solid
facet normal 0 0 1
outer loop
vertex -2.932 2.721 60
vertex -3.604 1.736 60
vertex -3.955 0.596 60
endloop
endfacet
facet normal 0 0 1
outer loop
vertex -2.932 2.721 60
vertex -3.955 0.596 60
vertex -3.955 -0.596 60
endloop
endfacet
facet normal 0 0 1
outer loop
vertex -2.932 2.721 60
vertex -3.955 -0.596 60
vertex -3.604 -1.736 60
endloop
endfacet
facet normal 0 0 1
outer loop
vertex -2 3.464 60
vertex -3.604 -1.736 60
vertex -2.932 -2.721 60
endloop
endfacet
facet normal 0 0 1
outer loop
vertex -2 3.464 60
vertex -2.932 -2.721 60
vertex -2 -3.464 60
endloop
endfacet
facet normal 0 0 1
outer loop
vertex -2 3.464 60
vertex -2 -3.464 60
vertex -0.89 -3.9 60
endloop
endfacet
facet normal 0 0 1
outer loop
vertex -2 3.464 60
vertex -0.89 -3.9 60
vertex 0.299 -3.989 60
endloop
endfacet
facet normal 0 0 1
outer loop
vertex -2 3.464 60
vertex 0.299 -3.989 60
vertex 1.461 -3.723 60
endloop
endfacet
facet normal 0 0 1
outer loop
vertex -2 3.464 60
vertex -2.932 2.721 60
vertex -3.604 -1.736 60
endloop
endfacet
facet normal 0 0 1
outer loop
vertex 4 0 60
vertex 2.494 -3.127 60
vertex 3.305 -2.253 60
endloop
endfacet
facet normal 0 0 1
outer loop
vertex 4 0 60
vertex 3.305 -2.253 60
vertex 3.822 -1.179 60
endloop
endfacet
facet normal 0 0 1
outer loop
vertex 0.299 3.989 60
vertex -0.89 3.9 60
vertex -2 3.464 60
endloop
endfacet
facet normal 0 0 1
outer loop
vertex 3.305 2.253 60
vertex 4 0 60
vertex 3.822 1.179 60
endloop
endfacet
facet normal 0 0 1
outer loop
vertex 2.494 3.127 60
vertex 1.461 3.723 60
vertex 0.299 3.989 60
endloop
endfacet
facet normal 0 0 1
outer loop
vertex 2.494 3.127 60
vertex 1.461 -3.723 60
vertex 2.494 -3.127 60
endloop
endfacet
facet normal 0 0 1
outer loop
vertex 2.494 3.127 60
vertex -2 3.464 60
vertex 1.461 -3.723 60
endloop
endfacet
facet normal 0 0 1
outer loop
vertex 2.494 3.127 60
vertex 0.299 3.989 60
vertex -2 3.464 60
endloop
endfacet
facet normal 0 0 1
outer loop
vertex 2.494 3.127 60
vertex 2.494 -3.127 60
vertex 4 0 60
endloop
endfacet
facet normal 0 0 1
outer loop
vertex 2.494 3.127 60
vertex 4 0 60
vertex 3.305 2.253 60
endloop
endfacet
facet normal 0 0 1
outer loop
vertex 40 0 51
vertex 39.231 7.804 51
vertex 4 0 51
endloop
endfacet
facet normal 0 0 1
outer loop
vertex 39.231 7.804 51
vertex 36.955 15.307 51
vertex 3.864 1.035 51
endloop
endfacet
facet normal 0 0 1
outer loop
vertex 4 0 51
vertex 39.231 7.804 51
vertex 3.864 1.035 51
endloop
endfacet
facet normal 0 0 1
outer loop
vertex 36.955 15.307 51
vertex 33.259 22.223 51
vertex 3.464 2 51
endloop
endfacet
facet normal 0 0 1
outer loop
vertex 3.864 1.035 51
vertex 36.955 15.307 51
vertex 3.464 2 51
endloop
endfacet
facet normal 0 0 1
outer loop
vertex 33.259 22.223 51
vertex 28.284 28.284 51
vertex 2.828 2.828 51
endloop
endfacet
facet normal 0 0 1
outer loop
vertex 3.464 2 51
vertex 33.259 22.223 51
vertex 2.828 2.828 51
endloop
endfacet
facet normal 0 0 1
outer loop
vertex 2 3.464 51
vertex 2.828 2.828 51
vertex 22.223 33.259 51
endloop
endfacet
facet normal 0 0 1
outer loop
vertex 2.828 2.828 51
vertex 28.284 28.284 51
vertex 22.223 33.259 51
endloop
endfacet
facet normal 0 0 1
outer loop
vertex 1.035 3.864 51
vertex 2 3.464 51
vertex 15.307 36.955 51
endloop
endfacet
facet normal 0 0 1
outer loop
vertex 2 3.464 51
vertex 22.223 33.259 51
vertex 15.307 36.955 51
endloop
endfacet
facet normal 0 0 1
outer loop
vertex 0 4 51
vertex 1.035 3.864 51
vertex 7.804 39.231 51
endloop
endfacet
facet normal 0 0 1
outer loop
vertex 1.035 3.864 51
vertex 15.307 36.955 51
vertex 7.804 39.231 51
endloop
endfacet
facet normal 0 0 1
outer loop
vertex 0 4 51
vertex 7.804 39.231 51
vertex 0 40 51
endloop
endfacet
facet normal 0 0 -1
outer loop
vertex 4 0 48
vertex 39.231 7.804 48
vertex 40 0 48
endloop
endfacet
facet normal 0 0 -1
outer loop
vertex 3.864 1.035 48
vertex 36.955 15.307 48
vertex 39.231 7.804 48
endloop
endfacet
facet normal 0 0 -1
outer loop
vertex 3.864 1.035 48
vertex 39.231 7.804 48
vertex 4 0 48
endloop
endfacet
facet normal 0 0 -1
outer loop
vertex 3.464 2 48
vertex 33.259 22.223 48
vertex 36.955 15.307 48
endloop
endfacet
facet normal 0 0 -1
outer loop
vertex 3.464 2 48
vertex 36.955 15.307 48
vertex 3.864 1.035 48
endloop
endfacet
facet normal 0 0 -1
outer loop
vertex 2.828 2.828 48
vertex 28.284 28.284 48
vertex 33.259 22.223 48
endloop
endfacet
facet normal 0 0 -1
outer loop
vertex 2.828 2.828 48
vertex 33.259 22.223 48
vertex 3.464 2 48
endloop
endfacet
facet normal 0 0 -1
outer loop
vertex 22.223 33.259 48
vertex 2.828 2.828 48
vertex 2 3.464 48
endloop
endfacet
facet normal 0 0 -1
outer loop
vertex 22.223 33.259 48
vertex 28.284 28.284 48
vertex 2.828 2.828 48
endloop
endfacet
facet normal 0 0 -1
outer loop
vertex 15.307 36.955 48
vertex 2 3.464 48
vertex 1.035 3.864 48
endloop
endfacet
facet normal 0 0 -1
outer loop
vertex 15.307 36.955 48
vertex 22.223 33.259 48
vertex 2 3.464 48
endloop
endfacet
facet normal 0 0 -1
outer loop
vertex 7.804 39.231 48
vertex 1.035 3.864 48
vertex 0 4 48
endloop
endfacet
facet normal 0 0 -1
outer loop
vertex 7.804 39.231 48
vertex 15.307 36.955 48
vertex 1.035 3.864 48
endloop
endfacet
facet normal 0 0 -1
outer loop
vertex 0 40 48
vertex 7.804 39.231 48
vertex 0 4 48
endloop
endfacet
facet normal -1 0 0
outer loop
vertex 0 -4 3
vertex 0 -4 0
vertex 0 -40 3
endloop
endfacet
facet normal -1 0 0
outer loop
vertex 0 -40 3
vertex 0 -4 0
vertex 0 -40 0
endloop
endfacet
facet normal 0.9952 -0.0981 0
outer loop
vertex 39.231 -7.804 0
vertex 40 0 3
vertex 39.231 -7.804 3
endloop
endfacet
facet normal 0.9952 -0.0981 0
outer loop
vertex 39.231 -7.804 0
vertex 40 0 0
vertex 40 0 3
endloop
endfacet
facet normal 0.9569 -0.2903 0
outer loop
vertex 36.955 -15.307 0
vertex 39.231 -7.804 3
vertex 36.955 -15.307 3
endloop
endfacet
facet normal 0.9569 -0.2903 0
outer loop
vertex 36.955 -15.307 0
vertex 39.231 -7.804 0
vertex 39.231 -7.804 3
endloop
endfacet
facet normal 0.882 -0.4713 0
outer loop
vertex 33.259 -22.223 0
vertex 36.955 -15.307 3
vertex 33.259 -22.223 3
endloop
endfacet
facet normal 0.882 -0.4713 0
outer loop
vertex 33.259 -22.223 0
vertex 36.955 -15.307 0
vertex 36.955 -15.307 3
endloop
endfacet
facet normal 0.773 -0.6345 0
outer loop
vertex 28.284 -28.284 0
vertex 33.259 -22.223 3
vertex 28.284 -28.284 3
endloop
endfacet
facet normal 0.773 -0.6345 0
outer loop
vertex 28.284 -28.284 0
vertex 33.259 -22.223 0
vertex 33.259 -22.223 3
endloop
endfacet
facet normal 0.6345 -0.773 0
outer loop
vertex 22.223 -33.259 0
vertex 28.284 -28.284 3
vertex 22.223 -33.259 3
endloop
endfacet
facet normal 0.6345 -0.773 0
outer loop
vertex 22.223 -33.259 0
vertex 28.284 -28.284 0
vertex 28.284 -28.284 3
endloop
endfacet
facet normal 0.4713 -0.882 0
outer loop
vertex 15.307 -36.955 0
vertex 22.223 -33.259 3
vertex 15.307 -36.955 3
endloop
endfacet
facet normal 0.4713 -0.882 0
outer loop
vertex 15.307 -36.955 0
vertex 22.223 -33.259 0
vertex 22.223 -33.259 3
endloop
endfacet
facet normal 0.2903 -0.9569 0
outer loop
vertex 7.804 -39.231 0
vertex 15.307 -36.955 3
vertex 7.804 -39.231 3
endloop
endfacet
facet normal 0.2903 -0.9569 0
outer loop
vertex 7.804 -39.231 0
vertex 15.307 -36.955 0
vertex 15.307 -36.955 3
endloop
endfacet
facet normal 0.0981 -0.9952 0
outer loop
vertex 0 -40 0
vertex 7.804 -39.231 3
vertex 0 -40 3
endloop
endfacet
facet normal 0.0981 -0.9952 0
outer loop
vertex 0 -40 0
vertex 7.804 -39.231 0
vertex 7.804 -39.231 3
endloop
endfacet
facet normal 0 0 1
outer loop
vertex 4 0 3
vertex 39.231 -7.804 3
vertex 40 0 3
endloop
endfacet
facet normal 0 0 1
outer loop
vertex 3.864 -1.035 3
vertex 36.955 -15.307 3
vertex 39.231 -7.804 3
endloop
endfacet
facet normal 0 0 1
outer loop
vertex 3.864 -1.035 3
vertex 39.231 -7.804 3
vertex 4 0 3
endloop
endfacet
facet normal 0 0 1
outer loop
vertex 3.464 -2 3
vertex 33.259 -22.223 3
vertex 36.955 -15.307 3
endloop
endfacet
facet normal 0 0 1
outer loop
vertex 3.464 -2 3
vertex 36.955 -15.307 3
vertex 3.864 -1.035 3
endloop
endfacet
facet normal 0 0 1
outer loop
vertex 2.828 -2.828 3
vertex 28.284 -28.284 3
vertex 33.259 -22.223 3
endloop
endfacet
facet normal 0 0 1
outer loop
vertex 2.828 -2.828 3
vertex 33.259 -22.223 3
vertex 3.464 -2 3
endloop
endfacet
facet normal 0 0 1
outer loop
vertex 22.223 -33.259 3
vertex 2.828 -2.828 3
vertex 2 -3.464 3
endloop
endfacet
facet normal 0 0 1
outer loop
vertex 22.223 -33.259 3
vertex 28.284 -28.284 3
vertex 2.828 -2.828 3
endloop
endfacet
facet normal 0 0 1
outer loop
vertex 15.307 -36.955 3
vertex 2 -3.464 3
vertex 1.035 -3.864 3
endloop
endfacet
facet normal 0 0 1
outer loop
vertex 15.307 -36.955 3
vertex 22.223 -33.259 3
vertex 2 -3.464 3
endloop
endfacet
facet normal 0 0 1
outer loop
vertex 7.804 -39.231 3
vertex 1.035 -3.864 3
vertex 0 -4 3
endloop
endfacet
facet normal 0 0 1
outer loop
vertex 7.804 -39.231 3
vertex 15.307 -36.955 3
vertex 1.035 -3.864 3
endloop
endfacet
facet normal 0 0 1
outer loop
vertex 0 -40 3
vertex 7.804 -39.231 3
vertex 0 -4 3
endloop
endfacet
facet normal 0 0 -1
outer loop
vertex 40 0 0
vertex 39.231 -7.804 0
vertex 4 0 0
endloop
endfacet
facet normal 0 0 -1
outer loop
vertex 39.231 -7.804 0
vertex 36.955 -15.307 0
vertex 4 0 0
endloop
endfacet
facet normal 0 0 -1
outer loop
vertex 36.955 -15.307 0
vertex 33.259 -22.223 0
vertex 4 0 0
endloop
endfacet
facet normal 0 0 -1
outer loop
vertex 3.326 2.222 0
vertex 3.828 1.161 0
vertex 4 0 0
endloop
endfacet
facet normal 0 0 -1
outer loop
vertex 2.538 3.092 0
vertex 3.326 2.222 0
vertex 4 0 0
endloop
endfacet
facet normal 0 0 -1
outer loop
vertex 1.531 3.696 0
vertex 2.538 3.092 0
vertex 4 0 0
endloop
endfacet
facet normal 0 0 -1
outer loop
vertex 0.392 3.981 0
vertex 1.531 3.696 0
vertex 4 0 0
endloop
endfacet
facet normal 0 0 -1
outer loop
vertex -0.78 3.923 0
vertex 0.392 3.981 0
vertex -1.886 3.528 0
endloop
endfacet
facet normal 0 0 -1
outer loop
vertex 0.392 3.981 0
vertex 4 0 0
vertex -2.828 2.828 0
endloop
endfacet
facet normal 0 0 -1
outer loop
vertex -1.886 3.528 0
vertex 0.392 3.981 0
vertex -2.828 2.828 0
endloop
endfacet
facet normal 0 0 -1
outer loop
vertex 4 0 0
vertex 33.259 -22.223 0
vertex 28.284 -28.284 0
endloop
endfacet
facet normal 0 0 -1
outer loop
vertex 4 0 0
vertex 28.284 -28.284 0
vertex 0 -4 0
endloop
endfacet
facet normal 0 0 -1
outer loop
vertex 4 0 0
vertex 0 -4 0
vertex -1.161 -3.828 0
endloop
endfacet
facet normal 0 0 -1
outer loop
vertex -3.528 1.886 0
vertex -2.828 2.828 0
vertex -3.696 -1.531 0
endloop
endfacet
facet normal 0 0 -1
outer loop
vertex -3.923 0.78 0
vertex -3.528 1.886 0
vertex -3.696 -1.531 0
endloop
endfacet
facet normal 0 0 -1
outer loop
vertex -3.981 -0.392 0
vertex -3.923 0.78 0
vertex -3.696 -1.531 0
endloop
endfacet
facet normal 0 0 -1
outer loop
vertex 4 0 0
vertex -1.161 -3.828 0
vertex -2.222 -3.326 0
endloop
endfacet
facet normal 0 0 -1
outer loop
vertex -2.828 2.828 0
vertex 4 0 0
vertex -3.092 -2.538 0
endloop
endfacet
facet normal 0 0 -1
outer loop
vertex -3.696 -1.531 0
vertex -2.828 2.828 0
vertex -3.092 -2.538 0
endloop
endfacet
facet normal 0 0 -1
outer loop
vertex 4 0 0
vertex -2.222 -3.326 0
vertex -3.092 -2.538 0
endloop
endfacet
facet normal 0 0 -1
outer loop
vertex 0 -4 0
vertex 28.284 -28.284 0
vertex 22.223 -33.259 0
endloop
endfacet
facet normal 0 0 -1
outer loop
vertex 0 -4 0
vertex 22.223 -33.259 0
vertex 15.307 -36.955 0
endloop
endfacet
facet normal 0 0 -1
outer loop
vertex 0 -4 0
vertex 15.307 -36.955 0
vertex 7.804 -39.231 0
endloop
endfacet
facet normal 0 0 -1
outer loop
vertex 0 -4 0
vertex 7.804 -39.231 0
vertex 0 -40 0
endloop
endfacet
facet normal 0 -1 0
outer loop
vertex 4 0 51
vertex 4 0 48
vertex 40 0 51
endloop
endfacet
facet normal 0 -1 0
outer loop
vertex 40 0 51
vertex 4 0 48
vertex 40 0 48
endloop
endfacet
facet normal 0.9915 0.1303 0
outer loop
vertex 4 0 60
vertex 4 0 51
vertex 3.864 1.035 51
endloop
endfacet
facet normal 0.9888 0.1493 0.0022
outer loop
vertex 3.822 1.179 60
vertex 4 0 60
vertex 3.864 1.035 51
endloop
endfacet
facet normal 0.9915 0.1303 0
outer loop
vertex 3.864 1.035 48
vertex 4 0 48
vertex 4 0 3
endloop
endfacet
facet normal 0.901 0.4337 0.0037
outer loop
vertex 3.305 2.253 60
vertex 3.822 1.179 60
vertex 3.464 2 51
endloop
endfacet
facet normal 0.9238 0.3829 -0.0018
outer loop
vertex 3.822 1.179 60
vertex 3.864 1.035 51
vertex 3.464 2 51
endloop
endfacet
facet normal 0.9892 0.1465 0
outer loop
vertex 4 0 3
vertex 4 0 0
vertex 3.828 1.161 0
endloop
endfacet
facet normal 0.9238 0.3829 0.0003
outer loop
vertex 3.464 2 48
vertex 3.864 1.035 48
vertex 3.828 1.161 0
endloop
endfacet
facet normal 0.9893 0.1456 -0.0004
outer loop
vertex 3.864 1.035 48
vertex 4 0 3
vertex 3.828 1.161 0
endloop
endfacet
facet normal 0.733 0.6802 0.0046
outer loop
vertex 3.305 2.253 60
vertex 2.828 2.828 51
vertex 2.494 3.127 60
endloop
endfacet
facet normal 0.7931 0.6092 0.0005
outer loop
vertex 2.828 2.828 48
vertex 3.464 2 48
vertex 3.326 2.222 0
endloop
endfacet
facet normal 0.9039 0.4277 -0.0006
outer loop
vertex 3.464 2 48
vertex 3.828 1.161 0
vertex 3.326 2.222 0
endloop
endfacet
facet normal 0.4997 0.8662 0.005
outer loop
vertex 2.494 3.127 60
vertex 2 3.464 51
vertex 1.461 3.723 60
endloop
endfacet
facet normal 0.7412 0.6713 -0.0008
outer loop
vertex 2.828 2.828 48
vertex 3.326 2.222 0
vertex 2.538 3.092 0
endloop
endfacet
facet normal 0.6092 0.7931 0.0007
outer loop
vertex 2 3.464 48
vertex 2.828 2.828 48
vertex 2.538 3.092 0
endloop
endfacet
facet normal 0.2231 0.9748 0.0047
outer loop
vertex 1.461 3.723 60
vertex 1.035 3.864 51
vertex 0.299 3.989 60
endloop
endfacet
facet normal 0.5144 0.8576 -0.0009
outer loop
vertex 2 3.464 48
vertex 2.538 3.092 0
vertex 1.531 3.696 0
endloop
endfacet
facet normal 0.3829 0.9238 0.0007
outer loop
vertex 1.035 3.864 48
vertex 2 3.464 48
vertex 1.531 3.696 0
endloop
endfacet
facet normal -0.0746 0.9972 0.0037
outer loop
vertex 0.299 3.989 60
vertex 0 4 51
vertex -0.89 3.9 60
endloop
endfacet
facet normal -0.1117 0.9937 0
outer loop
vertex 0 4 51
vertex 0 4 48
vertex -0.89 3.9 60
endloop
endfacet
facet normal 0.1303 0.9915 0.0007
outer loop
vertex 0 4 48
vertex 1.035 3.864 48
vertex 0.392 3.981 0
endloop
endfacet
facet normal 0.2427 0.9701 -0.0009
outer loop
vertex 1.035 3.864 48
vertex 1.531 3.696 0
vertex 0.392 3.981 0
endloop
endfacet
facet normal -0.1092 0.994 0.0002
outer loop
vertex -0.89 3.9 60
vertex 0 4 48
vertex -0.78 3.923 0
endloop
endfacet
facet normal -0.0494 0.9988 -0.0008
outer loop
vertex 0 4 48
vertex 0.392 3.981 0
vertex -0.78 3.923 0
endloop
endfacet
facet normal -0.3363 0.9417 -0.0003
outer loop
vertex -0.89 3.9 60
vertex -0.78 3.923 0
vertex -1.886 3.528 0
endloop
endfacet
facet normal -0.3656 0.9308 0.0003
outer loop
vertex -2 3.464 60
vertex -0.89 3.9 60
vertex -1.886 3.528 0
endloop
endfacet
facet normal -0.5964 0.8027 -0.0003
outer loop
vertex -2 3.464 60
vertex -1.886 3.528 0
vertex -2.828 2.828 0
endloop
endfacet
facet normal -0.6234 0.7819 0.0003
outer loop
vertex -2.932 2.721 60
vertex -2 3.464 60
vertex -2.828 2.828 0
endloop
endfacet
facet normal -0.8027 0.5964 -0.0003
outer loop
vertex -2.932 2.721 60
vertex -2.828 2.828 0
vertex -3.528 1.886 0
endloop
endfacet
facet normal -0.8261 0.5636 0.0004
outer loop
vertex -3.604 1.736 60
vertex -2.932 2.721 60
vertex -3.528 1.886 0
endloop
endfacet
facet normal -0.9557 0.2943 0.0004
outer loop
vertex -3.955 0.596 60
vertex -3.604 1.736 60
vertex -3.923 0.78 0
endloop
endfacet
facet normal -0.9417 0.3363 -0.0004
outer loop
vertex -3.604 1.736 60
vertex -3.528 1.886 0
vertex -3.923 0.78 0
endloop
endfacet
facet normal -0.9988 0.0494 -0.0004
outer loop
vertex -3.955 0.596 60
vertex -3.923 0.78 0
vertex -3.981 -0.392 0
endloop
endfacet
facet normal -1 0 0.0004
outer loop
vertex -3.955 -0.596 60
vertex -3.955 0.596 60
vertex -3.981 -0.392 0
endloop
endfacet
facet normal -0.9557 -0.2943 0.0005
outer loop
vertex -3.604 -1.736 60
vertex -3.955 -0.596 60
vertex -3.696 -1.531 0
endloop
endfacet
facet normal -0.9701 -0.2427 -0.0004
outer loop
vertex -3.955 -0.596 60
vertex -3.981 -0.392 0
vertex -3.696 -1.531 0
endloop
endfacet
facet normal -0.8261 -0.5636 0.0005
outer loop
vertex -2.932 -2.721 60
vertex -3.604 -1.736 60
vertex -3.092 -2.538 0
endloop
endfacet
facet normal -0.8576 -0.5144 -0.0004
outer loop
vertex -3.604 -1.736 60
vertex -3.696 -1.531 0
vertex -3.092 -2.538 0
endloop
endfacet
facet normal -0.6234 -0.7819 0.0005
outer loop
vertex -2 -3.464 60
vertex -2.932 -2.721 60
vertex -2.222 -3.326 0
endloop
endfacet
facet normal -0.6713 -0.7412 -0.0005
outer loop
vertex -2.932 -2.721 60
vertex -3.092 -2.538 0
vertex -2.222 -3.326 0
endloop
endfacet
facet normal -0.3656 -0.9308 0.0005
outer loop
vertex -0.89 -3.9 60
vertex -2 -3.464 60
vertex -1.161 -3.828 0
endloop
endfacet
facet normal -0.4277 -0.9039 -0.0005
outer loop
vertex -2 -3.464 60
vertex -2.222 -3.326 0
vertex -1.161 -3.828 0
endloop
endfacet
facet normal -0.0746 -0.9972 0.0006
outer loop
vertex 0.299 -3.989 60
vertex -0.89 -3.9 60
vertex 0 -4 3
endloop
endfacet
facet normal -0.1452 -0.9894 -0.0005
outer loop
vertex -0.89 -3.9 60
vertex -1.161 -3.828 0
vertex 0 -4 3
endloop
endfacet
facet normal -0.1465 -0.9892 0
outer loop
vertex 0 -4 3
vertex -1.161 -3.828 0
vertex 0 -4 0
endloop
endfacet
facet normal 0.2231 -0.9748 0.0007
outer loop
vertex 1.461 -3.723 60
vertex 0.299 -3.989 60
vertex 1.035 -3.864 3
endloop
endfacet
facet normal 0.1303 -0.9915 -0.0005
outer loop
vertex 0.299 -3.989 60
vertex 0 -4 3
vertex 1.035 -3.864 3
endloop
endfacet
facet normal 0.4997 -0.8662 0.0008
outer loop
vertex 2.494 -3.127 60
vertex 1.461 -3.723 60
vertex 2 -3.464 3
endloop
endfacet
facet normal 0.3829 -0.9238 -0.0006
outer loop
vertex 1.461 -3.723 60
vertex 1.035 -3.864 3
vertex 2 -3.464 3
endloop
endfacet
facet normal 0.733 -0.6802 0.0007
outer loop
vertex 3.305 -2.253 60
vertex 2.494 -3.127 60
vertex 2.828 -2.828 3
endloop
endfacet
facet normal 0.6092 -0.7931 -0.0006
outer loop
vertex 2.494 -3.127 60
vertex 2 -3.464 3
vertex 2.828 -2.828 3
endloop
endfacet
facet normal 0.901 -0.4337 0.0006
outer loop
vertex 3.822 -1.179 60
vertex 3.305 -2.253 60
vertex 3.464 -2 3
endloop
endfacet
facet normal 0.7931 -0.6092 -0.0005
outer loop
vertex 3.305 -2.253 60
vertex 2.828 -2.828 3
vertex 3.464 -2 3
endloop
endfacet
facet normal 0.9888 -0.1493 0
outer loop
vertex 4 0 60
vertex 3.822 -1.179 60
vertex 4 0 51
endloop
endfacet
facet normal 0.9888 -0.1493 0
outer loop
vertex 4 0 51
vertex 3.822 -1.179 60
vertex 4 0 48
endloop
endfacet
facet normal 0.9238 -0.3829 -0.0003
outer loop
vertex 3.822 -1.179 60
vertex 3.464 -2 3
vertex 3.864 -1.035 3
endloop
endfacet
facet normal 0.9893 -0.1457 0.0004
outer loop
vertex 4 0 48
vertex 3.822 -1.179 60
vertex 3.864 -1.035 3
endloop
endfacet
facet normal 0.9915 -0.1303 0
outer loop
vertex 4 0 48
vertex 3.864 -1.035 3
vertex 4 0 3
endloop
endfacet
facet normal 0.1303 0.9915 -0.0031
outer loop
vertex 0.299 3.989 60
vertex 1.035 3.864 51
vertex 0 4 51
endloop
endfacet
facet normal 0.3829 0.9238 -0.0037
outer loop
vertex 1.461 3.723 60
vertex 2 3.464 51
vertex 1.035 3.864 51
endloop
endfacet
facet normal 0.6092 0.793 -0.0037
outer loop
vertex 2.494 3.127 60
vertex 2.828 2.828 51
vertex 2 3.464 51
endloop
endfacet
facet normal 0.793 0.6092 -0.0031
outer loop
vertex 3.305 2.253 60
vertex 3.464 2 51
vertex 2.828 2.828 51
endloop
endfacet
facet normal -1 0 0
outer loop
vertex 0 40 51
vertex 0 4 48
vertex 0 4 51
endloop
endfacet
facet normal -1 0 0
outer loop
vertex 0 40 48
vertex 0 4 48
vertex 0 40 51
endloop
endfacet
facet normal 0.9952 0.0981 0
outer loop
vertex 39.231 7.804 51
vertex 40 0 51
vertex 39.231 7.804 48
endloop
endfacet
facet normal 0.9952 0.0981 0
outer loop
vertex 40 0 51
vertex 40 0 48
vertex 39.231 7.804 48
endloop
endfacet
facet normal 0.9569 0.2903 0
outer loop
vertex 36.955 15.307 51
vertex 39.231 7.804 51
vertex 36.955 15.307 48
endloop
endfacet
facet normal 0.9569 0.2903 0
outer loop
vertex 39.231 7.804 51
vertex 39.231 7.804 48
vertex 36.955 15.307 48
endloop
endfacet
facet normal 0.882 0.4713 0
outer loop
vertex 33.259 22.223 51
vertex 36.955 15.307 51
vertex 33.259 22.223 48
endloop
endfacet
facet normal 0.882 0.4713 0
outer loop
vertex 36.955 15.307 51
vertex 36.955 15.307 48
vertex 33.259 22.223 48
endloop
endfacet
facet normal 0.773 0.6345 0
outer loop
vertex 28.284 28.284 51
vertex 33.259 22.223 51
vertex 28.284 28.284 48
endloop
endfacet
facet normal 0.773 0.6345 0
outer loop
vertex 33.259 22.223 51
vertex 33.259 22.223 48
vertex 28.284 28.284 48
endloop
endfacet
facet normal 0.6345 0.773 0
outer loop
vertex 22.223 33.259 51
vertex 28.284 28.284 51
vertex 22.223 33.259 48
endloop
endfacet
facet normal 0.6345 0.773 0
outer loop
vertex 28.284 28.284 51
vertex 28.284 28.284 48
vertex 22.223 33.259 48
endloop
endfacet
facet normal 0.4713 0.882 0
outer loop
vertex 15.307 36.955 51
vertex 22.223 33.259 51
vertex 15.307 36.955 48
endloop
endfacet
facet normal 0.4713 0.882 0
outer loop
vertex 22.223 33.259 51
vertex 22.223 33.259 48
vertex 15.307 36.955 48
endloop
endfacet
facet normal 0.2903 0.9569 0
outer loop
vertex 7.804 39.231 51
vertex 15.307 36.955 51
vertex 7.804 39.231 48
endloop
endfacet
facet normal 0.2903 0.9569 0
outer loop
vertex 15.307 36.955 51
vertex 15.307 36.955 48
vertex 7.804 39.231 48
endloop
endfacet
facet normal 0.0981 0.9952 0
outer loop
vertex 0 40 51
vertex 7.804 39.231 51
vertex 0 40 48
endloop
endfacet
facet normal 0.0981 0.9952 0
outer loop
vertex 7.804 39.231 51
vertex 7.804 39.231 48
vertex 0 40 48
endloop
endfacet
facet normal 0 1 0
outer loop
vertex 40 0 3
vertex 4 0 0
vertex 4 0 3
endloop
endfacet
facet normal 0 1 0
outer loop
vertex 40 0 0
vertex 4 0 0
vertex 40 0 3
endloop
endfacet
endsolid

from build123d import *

# Parameters (mm, degrees)
SKETCH_1_R      = 4
EXTRUDE_1_DEPTH = 60
SKETCH_2_W      = 40
SKETCH_2_H      = 3
REVOLVE_1_ANGLE = 90
SKETCH_3_W      = 40
SKETCH_3_H      = 3
REVOLVE_2_ANGLE = 90


with BuildPart() as part:
    # 草图1 → 凸台-拉伸1 (new body)
    with BuildSketch(Plane.XY):
        Circle(SKETCH_1_R)
    extrude(amount=EXTRUDE_1_DEPTH)

    # 草图2 → 旋转1 (revolve)
    with BuildSketch(Plane(origin=(0, 0, 0), x_dir=(1, 0, 0), z_dir=(0, 1, 0))):
        with Locations((20, -49.5)):
            Rectangle(SKETCH_2_W, SKETCH_2_H)
    revolve(axis=Axis((0, 0, -2.761338376), (0, 0, 1)), revolution_arc=REVOLVE_1_ANGLE)

    # 草图3 → 旋转2 (revolve)
    with BuildSketch(Plane(origin=(0, 0, 0), x_dir=(1, 0, 0), z_dir=(0, 1, 0))):
        with Locations((20, -1.5)):
            Rectangle(SKETCH_3_W, SKETCH_3_H)
    revolve(axis=Axis((0, 0, -6.370265632), (0, 0, -1)), revolution_arc=REVOLVE_2_ANGLE)


solid = part.part
